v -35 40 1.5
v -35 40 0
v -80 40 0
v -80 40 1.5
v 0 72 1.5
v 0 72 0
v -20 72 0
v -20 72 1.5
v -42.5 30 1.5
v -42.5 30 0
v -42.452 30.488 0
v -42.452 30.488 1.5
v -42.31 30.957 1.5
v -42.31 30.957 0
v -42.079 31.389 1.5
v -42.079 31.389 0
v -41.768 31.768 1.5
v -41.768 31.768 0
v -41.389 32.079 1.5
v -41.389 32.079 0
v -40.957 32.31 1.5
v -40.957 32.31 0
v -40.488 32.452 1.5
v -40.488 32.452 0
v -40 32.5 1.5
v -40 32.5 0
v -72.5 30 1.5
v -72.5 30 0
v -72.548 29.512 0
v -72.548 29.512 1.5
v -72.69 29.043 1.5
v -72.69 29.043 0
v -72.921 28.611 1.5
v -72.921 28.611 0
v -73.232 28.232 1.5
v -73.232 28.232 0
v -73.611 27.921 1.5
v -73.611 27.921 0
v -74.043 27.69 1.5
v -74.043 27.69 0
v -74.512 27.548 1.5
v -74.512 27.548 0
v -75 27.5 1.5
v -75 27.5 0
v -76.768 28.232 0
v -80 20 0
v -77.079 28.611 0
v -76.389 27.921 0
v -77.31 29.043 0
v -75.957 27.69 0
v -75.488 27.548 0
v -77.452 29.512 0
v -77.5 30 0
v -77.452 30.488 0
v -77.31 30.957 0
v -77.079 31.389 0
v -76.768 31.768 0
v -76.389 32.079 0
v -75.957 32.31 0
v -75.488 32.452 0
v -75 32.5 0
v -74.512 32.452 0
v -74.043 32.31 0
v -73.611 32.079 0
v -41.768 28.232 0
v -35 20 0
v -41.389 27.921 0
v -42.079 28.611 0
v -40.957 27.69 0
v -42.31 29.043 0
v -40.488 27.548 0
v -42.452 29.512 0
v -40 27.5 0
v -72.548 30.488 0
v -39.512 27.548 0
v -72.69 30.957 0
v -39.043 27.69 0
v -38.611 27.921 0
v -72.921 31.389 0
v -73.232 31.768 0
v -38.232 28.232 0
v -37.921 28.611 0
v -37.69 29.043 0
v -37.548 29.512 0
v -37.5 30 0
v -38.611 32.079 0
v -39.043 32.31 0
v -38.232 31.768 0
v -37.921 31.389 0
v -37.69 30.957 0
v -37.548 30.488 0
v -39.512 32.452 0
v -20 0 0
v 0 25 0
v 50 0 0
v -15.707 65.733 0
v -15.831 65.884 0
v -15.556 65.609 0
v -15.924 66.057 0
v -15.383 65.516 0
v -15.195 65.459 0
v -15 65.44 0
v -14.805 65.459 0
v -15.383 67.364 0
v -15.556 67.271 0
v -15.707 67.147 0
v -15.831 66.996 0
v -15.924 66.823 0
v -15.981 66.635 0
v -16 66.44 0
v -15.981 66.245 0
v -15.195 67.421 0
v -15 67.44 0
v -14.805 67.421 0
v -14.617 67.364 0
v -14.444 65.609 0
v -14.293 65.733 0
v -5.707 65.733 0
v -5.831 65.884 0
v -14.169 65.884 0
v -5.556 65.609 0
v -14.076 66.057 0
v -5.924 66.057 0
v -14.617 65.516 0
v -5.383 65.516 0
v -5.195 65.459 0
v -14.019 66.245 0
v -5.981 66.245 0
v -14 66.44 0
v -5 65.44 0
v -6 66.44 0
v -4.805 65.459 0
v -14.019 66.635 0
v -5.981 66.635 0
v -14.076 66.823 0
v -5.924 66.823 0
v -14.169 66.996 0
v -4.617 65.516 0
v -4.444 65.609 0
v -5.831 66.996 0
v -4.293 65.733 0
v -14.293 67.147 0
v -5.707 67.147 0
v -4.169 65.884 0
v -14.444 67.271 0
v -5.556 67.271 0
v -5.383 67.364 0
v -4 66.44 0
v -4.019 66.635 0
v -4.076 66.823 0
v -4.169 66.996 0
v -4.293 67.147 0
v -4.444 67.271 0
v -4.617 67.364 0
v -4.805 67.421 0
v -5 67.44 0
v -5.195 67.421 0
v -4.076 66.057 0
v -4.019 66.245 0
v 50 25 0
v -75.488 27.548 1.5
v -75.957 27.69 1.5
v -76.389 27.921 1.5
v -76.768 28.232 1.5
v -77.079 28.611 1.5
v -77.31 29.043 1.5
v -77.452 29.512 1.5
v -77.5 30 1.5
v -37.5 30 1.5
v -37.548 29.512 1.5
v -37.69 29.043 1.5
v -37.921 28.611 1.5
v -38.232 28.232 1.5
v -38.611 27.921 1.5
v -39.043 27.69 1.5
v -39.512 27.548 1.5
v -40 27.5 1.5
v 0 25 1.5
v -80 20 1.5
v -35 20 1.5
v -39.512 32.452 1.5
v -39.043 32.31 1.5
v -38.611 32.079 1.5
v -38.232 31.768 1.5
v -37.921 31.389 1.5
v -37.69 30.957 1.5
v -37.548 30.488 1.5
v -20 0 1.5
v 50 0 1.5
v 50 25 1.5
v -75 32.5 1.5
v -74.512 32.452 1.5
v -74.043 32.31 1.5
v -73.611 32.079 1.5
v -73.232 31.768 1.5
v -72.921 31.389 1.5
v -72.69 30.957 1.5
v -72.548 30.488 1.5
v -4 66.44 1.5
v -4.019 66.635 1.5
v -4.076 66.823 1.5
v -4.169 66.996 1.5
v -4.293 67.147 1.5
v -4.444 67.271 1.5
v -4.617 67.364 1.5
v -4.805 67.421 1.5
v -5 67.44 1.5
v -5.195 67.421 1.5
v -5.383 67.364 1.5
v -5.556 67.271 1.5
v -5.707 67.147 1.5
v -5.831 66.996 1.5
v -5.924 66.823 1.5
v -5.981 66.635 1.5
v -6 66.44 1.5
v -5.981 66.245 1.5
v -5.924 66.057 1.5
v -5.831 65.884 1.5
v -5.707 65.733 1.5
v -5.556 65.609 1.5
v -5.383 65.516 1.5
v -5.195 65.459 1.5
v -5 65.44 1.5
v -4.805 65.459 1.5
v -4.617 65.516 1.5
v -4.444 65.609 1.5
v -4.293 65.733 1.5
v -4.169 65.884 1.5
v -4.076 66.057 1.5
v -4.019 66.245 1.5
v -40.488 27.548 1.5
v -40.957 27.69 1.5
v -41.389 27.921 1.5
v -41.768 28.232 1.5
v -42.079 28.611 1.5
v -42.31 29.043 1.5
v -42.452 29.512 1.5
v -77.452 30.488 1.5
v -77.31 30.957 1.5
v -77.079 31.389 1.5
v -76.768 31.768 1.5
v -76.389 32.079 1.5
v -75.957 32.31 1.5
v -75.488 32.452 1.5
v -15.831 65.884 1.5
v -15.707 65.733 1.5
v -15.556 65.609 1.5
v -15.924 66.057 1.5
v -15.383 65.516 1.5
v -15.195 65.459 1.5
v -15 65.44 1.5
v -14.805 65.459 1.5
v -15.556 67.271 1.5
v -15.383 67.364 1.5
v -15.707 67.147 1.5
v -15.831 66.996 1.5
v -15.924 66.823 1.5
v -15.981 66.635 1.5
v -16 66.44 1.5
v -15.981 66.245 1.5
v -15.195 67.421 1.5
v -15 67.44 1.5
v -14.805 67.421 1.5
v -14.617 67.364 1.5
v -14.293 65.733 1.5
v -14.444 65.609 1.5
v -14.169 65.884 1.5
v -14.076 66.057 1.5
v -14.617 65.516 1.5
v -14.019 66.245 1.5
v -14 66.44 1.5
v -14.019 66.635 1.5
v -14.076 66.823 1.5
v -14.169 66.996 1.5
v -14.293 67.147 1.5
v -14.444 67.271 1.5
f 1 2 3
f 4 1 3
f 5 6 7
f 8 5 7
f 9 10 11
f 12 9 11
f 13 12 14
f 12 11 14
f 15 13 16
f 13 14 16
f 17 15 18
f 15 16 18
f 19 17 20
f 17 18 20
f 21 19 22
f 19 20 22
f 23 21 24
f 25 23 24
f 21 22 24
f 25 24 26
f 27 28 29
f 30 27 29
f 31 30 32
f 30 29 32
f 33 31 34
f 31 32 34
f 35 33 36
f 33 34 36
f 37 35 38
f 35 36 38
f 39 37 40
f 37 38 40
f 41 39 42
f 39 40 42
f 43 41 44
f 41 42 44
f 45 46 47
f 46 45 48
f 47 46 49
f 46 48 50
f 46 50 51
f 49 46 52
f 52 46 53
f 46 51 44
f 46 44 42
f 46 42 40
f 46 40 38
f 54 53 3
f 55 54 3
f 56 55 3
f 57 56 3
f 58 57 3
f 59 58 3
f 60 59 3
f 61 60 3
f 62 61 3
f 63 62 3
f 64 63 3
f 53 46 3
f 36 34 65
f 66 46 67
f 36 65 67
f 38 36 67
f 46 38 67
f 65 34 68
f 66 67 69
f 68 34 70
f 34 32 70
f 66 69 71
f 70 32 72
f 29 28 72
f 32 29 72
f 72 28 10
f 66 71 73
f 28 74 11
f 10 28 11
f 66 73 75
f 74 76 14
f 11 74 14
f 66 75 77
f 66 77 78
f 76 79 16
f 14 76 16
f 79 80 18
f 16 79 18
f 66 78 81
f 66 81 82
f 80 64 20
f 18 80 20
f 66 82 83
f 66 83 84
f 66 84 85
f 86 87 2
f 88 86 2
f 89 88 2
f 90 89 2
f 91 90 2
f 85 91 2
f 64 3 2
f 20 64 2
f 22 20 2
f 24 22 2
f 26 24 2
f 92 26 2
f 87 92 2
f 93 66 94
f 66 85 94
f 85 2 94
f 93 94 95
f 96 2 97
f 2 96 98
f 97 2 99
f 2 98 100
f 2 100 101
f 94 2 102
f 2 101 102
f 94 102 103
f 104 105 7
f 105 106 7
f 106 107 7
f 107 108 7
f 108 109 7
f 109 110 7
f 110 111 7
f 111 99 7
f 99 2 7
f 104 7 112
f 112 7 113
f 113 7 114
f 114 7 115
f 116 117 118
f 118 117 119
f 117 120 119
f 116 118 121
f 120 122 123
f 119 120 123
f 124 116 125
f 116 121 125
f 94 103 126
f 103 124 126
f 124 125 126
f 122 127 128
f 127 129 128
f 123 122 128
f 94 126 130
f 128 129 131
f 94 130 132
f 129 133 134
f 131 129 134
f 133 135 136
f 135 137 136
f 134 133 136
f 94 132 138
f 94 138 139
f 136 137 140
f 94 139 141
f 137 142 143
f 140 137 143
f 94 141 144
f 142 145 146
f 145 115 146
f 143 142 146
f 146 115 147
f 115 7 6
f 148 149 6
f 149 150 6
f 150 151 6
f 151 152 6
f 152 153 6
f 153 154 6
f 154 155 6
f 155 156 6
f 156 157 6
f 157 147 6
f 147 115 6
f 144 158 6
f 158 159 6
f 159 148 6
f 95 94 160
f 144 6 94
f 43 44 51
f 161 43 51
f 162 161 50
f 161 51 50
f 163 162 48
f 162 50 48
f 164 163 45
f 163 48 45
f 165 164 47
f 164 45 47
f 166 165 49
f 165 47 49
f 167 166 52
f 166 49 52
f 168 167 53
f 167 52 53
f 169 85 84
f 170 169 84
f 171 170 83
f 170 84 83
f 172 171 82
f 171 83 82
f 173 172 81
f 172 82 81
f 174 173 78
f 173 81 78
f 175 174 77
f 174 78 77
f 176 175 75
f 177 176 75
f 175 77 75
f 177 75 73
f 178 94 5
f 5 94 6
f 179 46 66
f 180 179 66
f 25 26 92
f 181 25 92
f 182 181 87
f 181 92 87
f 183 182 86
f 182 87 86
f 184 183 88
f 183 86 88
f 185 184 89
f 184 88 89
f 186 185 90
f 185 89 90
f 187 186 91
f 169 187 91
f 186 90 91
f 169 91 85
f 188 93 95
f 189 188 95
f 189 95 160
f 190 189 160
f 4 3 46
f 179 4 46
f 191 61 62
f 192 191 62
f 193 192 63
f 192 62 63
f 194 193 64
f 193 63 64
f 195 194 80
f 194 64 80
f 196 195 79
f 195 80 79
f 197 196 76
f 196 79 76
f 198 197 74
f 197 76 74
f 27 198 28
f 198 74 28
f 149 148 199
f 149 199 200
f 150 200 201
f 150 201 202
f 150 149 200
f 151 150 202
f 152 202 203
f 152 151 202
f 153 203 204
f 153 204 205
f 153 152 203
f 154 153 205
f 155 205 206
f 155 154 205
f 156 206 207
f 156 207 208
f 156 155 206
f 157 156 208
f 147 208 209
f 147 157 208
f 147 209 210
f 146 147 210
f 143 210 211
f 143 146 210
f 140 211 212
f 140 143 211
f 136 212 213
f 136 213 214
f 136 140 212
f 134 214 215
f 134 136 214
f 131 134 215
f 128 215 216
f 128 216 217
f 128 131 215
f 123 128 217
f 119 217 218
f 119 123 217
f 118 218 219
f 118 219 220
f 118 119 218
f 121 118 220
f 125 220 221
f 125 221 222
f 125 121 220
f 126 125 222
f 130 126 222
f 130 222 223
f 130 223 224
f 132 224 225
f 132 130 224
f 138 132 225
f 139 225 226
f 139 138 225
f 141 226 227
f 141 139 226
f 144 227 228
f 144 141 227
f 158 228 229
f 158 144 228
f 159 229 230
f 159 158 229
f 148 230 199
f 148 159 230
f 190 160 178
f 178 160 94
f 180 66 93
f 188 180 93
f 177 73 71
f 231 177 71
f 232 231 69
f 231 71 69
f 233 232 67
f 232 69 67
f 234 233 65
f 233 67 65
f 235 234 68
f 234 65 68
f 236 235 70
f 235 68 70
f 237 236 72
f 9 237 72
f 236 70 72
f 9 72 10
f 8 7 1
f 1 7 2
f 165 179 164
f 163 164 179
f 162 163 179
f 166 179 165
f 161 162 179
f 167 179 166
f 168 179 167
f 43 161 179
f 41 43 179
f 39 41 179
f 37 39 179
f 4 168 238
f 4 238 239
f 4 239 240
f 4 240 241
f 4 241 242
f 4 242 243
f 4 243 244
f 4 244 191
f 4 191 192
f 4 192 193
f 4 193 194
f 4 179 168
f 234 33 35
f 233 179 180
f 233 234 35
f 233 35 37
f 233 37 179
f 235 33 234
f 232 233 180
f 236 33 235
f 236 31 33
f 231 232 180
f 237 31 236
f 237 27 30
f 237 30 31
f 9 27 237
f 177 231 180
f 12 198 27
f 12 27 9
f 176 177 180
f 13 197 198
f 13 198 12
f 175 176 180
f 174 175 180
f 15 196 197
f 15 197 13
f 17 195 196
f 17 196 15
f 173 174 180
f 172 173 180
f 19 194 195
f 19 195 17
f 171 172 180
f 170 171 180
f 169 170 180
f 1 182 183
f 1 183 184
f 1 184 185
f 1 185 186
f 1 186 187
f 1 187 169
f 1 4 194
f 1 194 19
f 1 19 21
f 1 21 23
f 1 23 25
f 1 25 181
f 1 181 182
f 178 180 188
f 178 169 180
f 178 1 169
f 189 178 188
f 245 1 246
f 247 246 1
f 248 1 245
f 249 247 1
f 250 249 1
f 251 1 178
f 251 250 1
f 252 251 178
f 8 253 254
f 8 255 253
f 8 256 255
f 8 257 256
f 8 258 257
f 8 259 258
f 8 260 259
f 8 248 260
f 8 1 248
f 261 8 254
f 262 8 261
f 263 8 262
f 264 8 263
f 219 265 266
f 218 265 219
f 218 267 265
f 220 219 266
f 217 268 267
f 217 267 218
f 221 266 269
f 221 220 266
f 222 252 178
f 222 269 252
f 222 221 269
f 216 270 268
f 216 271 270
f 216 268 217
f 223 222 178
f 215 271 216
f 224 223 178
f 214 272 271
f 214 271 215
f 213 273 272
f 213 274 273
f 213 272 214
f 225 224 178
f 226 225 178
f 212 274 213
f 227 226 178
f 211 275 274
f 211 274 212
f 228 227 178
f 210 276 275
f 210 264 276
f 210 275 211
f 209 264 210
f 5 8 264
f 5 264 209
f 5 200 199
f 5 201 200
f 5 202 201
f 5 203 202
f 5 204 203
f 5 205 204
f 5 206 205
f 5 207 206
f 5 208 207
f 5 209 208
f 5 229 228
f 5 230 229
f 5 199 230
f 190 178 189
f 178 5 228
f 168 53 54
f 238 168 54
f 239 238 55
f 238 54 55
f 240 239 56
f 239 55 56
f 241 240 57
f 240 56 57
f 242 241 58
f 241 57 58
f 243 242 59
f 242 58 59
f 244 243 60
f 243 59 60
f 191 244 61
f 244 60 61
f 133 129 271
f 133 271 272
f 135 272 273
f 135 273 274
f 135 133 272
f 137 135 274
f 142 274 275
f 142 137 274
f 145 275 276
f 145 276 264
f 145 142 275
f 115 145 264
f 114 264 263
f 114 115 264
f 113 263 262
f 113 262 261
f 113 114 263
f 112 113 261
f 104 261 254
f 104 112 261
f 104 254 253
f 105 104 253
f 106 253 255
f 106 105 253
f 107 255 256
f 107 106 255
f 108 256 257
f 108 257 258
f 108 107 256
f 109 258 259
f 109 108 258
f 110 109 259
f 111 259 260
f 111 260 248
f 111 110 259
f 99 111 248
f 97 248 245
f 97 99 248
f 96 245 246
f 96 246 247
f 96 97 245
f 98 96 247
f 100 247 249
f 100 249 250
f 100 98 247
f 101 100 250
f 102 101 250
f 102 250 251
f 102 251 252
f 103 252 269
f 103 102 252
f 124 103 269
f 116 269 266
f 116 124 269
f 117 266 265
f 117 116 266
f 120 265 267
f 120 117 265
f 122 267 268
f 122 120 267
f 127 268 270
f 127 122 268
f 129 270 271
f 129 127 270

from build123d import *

# Parameters (mm, degrees)
SKETCH1_R           = 1
BOSS_EXTRUDE1_DEPTH = 1.5


with BuildPart() as part:
    # Sketch1 → Boss-Extrude1 (new body)
    # profile 1 of 5: a face of its own
    with BuildSketch(Plane.XY):
        Polygon((0, 72), (-20, 72), (-35, 40), (-57.5, 40), (-57.5, 30), (-57.5, 20), (-35, 20), (-20, 0), (0, 0), (50, 0), (50, 25), (0, 25), align=None)
        with BuildLine():
            ThreePointArc((-40, 27.5), (-41.767766953, 28.232233047), (-42.5, 30))
            ThreePointArc((-42.5, 30), (-41.767766953, 31.767766953), (-40, 32.5))
            ThreePointArc((-40, 32.5), (-38.232233047, 31.767766953), (-37.5, 30))
            ThreePointArc((-37.5, 30), (-38.232233047, 28.232233047), (-40, 27.5))
        make_face(mode=Mode.SUBTRACT)
        with Locations((-15, 66.44)):
            Circle(SKETCH1_R, mode=Mode.SUBTRACT)
        with Locations((-5, 66.44)):
            Circle(SKETCH1_R, mode=Mode.SUBTRACT)
    # profile 2 of 5: a face of its own
    with BuildSketch(Plane.XY):
        with BuildLine():
            Line((-57.5, 30), (-57.5, 40))
            Line((-57.5, 40), (-75, 40))
            Line((-75, 40), (-75, 32.5))
            ThreePointArc((-75, 32.5), (-73.232233047, 31.767766953), (-72.5, 30))
            Line((-72.5, 30), (-57.5, 30))
        make_face()
    # profile 3 of 5: a face of its own
    with BuildSketch(Plane.XY):
        with BuildLine():
            Line((-57.5, 20), (-57.5, 30))
            Line((-57.5, 30), (-72.5, 30))
            ThreePointArc((-72.5, 30), (-73.232233047, 28.232233047), (-75, 27.5))
            Line((-75, 27.5), (-75, 20))
            Line((-75, 20), (-57.5, 20))
        make_face()
    # profile 4 of 5: a face of its own
    with BuildSketch(Plane.XY):
        with BuildLine():
            Line((-77.5, 30), (-80, 30))
            Line((-80, 30), (-80, 20))
            Line((-80, 20), (-75, 20))
            Line((-75, 20), (-75, 27.5))
            ThreePointArc((-75, 27.5), (-76.767766953, 28.232233047), (-77.5, 30))
        make_face()
    # profile 5 of 5: a face of its own
    with BuildSketch(Plane.XY):
        with BuildLine():
            Line((-75, 32.5), (-75, 40))
            Line((-75, 40), (-80, 40))
            Line((-80, 40), (-80, 30))
            Line((-80, 30), (-77.5, 30))
            ThreePointArc((-77.5, 30), (-76.767766953, 31.767766953), (-75, 32.5))
        make_face()
    extrude(amount=BOSS_EXTRUDE1_DEPTH)


solid = part.part
